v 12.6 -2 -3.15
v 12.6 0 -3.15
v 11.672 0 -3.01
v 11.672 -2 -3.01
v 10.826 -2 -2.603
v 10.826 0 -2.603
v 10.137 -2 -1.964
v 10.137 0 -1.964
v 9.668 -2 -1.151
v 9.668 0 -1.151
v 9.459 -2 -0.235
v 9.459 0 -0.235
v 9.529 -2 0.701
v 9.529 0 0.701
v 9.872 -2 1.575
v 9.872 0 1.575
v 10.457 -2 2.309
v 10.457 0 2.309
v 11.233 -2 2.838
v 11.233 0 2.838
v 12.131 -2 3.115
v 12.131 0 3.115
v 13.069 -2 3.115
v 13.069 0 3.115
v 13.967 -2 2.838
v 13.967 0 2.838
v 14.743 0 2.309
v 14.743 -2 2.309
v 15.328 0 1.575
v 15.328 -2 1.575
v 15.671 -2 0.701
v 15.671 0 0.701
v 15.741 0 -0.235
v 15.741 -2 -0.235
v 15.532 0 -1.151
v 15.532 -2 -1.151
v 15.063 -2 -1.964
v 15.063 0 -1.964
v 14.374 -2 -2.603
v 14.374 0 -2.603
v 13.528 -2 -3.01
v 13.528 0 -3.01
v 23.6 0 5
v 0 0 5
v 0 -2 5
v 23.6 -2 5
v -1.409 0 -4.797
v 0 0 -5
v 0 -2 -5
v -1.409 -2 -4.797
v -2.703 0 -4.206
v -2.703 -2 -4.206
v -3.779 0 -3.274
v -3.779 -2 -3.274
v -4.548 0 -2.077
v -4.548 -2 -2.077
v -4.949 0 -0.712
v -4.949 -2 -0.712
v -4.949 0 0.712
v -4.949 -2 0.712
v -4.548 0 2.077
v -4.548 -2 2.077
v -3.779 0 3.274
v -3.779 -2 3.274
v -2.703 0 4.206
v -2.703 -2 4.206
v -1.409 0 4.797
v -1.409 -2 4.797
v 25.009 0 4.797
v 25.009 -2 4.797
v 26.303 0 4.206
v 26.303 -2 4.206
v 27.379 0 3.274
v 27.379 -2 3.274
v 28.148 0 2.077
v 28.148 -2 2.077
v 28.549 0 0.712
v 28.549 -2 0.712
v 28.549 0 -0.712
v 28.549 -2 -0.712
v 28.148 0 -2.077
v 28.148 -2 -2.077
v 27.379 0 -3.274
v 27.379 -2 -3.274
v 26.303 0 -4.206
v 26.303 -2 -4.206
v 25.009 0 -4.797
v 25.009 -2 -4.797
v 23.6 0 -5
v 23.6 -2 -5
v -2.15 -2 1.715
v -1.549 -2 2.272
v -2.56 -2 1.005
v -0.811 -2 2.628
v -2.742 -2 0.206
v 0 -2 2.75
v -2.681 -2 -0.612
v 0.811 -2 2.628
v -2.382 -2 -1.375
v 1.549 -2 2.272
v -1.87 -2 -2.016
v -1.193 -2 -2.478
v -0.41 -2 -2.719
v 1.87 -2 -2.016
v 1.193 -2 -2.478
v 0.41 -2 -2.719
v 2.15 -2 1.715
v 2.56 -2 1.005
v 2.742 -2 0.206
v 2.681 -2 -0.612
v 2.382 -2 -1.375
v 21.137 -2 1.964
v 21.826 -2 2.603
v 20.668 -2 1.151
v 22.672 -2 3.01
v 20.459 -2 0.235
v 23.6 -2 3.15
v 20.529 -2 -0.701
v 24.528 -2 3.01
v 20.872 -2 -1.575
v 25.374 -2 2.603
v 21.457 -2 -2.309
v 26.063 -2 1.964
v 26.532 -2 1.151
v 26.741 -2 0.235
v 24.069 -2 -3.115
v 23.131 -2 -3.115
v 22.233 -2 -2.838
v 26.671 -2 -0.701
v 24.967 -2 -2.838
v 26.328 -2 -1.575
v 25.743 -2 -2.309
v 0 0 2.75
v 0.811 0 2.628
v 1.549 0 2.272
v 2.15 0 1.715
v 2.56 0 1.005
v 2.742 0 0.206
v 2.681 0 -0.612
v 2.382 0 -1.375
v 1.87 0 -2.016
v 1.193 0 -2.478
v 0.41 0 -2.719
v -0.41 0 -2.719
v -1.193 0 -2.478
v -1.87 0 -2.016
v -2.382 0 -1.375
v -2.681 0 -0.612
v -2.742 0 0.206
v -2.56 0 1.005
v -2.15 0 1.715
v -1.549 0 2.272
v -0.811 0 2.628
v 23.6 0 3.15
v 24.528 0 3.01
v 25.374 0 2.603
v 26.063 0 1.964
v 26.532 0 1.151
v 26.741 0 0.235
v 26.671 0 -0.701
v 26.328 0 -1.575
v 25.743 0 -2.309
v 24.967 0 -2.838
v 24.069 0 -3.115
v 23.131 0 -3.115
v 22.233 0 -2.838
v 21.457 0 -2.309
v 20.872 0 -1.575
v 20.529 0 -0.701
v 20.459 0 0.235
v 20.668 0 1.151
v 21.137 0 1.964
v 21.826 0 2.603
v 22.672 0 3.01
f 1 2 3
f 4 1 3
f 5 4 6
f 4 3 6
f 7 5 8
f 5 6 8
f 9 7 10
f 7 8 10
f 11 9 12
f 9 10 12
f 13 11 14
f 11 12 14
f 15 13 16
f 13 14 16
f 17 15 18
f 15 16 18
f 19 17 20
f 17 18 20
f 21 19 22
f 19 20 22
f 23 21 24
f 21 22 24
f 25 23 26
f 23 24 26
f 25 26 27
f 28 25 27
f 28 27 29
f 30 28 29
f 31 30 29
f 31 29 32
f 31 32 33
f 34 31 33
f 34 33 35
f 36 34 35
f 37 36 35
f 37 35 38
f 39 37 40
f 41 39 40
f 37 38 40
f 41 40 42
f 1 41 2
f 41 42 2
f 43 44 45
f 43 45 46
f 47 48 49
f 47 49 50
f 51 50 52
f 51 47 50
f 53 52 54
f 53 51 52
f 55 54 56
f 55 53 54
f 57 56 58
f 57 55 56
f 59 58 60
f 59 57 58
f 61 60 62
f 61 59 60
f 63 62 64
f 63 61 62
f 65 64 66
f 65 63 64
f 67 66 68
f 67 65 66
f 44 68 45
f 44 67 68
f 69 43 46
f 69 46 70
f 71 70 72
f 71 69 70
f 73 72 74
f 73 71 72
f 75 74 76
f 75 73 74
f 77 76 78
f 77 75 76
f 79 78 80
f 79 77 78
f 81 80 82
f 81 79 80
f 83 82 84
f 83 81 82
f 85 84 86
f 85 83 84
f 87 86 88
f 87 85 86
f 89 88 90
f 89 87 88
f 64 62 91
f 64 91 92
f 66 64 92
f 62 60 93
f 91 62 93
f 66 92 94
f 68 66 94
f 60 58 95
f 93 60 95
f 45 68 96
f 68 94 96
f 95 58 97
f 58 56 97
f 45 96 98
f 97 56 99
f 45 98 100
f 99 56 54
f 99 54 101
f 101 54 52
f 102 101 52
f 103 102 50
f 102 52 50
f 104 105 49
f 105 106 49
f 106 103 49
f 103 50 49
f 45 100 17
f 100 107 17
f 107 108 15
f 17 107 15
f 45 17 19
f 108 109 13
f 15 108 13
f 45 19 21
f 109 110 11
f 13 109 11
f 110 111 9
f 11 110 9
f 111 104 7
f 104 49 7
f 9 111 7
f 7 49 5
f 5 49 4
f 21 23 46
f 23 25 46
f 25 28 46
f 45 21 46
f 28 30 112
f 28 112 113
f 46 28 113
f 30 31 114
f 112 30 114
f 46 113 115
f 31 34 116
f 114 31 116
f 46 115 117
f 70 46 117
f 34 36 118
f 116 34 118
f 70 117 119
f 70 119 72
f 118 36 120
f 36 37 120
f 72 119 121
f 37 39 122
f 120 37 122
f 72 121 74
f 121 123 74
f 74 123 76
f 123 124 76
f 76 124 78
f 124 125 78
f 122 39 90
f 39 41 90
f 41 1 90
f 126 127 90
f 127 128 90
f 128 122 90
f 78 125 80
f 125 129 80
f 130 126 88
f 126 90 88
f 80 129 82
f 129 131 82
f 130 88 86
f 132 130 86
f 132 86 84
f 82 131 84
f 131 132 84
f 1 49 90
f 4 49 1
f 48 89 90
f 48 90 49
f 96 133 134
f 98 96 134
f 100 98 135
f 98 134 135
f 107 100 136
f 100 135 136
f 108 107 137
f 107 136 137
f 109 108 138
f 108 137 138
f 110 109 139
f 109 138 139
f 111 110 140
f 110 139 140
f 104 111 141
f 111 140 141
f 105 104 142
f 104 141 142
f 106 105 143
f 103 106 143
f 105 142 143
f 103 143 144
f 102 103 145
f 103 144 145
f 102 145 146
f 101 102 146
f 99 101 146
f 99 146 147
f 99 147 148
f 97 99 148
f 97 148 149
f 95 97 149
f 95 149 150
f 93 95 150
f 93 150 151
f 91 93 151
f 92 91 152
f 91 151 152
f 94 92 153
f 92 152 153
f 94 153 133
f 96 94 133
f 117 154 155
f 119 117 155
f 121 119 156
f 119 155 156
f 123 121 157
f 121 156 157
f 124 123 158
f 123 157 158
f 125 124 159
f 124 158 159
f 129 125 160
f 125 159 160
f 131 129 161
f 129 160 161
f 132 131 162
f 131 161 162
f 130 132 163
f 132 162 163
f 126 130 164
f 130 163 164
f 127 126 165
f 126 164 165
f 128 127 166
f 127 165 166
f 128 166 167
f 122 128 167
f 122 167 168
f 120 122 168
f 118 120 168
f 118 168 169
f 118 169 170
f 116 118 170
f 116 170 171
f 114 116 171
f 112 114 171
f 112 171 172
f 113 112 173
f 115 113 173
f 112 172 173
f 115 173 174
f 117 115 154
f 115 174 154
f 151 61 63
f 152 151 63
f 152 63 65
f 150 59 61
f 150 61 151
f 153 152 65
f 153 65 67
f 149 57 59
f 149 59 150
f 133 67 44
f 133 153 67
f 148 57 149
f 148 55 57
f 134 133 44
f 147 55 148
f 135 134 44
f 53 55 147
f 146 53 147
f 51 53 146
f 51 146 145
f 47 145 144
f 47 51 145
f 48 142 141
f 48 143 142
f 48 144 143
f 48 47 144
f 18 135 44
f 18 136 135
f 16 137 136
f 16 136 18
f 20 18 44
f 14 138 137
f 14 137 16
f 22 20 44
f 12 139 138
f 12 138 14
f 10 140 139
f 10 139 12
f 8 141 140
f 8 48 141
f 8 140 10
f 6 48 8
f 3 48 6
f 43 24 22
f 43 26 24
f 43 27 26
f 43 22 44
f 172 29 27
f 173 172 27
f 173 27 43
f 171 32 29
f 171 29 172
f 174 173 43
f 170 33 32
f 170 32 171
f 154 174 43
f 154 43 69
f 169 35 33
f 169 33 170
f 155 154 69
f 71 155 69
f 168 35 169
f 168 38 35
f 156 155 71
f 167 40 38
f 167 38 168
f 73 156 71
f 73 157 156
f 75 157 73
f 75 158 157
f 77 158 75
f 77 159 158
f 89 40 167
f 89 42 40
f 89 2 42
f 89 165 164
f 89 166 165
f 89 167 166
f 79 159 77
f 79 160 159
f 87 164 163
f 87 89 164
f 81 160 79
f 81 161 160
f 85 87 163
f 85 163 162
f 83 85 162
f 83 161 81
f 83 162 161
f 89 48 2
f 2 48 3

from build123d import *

# Parameters (mm, degrees)
SKETCH2_R           = 3.15
SKETCH2_R_2         = 2.75
BOSS_EXTRUDE1_DEPTH = 2


with BuildPart() as part:
    # Sketch2 → Boss-Extrude1 (new body)
    with BuildSketch(Plane(origin=(0, 0, 0), x_dir=(1, 0, 0), z_dir=(0, 1, 0))):
        with BuildLine():
            Line((23.6, 5), (0, 5))
            ThreePointArc((0, 5), (-5, 0), (0, -5))
            Line((0, -5), (23.6, -5))
            ThreePointArc((23.6, -5), (28.6, 0), (23.6, 5))
        make_face()
        with Locations(Location((23.6, 0, 0), (0, 0, 270))):
            Circle(SKETCH2_R, mode=Mode.SUBTRACT)
        with Locations(Location((12.6, 0, 0), (0, 0, 90))):
            Circle(SKETCH2_R, mode=Mode.SUBTRACT)
        with Locations(Location((0, 0, 0), (0, 0, 270))):
            Circle(SKETCH2_R_2, mode=Mode.SUBTRACT)
    extrude(amount=-BOSS_EXTRUDE1_DEPTH)


solid = part.part
